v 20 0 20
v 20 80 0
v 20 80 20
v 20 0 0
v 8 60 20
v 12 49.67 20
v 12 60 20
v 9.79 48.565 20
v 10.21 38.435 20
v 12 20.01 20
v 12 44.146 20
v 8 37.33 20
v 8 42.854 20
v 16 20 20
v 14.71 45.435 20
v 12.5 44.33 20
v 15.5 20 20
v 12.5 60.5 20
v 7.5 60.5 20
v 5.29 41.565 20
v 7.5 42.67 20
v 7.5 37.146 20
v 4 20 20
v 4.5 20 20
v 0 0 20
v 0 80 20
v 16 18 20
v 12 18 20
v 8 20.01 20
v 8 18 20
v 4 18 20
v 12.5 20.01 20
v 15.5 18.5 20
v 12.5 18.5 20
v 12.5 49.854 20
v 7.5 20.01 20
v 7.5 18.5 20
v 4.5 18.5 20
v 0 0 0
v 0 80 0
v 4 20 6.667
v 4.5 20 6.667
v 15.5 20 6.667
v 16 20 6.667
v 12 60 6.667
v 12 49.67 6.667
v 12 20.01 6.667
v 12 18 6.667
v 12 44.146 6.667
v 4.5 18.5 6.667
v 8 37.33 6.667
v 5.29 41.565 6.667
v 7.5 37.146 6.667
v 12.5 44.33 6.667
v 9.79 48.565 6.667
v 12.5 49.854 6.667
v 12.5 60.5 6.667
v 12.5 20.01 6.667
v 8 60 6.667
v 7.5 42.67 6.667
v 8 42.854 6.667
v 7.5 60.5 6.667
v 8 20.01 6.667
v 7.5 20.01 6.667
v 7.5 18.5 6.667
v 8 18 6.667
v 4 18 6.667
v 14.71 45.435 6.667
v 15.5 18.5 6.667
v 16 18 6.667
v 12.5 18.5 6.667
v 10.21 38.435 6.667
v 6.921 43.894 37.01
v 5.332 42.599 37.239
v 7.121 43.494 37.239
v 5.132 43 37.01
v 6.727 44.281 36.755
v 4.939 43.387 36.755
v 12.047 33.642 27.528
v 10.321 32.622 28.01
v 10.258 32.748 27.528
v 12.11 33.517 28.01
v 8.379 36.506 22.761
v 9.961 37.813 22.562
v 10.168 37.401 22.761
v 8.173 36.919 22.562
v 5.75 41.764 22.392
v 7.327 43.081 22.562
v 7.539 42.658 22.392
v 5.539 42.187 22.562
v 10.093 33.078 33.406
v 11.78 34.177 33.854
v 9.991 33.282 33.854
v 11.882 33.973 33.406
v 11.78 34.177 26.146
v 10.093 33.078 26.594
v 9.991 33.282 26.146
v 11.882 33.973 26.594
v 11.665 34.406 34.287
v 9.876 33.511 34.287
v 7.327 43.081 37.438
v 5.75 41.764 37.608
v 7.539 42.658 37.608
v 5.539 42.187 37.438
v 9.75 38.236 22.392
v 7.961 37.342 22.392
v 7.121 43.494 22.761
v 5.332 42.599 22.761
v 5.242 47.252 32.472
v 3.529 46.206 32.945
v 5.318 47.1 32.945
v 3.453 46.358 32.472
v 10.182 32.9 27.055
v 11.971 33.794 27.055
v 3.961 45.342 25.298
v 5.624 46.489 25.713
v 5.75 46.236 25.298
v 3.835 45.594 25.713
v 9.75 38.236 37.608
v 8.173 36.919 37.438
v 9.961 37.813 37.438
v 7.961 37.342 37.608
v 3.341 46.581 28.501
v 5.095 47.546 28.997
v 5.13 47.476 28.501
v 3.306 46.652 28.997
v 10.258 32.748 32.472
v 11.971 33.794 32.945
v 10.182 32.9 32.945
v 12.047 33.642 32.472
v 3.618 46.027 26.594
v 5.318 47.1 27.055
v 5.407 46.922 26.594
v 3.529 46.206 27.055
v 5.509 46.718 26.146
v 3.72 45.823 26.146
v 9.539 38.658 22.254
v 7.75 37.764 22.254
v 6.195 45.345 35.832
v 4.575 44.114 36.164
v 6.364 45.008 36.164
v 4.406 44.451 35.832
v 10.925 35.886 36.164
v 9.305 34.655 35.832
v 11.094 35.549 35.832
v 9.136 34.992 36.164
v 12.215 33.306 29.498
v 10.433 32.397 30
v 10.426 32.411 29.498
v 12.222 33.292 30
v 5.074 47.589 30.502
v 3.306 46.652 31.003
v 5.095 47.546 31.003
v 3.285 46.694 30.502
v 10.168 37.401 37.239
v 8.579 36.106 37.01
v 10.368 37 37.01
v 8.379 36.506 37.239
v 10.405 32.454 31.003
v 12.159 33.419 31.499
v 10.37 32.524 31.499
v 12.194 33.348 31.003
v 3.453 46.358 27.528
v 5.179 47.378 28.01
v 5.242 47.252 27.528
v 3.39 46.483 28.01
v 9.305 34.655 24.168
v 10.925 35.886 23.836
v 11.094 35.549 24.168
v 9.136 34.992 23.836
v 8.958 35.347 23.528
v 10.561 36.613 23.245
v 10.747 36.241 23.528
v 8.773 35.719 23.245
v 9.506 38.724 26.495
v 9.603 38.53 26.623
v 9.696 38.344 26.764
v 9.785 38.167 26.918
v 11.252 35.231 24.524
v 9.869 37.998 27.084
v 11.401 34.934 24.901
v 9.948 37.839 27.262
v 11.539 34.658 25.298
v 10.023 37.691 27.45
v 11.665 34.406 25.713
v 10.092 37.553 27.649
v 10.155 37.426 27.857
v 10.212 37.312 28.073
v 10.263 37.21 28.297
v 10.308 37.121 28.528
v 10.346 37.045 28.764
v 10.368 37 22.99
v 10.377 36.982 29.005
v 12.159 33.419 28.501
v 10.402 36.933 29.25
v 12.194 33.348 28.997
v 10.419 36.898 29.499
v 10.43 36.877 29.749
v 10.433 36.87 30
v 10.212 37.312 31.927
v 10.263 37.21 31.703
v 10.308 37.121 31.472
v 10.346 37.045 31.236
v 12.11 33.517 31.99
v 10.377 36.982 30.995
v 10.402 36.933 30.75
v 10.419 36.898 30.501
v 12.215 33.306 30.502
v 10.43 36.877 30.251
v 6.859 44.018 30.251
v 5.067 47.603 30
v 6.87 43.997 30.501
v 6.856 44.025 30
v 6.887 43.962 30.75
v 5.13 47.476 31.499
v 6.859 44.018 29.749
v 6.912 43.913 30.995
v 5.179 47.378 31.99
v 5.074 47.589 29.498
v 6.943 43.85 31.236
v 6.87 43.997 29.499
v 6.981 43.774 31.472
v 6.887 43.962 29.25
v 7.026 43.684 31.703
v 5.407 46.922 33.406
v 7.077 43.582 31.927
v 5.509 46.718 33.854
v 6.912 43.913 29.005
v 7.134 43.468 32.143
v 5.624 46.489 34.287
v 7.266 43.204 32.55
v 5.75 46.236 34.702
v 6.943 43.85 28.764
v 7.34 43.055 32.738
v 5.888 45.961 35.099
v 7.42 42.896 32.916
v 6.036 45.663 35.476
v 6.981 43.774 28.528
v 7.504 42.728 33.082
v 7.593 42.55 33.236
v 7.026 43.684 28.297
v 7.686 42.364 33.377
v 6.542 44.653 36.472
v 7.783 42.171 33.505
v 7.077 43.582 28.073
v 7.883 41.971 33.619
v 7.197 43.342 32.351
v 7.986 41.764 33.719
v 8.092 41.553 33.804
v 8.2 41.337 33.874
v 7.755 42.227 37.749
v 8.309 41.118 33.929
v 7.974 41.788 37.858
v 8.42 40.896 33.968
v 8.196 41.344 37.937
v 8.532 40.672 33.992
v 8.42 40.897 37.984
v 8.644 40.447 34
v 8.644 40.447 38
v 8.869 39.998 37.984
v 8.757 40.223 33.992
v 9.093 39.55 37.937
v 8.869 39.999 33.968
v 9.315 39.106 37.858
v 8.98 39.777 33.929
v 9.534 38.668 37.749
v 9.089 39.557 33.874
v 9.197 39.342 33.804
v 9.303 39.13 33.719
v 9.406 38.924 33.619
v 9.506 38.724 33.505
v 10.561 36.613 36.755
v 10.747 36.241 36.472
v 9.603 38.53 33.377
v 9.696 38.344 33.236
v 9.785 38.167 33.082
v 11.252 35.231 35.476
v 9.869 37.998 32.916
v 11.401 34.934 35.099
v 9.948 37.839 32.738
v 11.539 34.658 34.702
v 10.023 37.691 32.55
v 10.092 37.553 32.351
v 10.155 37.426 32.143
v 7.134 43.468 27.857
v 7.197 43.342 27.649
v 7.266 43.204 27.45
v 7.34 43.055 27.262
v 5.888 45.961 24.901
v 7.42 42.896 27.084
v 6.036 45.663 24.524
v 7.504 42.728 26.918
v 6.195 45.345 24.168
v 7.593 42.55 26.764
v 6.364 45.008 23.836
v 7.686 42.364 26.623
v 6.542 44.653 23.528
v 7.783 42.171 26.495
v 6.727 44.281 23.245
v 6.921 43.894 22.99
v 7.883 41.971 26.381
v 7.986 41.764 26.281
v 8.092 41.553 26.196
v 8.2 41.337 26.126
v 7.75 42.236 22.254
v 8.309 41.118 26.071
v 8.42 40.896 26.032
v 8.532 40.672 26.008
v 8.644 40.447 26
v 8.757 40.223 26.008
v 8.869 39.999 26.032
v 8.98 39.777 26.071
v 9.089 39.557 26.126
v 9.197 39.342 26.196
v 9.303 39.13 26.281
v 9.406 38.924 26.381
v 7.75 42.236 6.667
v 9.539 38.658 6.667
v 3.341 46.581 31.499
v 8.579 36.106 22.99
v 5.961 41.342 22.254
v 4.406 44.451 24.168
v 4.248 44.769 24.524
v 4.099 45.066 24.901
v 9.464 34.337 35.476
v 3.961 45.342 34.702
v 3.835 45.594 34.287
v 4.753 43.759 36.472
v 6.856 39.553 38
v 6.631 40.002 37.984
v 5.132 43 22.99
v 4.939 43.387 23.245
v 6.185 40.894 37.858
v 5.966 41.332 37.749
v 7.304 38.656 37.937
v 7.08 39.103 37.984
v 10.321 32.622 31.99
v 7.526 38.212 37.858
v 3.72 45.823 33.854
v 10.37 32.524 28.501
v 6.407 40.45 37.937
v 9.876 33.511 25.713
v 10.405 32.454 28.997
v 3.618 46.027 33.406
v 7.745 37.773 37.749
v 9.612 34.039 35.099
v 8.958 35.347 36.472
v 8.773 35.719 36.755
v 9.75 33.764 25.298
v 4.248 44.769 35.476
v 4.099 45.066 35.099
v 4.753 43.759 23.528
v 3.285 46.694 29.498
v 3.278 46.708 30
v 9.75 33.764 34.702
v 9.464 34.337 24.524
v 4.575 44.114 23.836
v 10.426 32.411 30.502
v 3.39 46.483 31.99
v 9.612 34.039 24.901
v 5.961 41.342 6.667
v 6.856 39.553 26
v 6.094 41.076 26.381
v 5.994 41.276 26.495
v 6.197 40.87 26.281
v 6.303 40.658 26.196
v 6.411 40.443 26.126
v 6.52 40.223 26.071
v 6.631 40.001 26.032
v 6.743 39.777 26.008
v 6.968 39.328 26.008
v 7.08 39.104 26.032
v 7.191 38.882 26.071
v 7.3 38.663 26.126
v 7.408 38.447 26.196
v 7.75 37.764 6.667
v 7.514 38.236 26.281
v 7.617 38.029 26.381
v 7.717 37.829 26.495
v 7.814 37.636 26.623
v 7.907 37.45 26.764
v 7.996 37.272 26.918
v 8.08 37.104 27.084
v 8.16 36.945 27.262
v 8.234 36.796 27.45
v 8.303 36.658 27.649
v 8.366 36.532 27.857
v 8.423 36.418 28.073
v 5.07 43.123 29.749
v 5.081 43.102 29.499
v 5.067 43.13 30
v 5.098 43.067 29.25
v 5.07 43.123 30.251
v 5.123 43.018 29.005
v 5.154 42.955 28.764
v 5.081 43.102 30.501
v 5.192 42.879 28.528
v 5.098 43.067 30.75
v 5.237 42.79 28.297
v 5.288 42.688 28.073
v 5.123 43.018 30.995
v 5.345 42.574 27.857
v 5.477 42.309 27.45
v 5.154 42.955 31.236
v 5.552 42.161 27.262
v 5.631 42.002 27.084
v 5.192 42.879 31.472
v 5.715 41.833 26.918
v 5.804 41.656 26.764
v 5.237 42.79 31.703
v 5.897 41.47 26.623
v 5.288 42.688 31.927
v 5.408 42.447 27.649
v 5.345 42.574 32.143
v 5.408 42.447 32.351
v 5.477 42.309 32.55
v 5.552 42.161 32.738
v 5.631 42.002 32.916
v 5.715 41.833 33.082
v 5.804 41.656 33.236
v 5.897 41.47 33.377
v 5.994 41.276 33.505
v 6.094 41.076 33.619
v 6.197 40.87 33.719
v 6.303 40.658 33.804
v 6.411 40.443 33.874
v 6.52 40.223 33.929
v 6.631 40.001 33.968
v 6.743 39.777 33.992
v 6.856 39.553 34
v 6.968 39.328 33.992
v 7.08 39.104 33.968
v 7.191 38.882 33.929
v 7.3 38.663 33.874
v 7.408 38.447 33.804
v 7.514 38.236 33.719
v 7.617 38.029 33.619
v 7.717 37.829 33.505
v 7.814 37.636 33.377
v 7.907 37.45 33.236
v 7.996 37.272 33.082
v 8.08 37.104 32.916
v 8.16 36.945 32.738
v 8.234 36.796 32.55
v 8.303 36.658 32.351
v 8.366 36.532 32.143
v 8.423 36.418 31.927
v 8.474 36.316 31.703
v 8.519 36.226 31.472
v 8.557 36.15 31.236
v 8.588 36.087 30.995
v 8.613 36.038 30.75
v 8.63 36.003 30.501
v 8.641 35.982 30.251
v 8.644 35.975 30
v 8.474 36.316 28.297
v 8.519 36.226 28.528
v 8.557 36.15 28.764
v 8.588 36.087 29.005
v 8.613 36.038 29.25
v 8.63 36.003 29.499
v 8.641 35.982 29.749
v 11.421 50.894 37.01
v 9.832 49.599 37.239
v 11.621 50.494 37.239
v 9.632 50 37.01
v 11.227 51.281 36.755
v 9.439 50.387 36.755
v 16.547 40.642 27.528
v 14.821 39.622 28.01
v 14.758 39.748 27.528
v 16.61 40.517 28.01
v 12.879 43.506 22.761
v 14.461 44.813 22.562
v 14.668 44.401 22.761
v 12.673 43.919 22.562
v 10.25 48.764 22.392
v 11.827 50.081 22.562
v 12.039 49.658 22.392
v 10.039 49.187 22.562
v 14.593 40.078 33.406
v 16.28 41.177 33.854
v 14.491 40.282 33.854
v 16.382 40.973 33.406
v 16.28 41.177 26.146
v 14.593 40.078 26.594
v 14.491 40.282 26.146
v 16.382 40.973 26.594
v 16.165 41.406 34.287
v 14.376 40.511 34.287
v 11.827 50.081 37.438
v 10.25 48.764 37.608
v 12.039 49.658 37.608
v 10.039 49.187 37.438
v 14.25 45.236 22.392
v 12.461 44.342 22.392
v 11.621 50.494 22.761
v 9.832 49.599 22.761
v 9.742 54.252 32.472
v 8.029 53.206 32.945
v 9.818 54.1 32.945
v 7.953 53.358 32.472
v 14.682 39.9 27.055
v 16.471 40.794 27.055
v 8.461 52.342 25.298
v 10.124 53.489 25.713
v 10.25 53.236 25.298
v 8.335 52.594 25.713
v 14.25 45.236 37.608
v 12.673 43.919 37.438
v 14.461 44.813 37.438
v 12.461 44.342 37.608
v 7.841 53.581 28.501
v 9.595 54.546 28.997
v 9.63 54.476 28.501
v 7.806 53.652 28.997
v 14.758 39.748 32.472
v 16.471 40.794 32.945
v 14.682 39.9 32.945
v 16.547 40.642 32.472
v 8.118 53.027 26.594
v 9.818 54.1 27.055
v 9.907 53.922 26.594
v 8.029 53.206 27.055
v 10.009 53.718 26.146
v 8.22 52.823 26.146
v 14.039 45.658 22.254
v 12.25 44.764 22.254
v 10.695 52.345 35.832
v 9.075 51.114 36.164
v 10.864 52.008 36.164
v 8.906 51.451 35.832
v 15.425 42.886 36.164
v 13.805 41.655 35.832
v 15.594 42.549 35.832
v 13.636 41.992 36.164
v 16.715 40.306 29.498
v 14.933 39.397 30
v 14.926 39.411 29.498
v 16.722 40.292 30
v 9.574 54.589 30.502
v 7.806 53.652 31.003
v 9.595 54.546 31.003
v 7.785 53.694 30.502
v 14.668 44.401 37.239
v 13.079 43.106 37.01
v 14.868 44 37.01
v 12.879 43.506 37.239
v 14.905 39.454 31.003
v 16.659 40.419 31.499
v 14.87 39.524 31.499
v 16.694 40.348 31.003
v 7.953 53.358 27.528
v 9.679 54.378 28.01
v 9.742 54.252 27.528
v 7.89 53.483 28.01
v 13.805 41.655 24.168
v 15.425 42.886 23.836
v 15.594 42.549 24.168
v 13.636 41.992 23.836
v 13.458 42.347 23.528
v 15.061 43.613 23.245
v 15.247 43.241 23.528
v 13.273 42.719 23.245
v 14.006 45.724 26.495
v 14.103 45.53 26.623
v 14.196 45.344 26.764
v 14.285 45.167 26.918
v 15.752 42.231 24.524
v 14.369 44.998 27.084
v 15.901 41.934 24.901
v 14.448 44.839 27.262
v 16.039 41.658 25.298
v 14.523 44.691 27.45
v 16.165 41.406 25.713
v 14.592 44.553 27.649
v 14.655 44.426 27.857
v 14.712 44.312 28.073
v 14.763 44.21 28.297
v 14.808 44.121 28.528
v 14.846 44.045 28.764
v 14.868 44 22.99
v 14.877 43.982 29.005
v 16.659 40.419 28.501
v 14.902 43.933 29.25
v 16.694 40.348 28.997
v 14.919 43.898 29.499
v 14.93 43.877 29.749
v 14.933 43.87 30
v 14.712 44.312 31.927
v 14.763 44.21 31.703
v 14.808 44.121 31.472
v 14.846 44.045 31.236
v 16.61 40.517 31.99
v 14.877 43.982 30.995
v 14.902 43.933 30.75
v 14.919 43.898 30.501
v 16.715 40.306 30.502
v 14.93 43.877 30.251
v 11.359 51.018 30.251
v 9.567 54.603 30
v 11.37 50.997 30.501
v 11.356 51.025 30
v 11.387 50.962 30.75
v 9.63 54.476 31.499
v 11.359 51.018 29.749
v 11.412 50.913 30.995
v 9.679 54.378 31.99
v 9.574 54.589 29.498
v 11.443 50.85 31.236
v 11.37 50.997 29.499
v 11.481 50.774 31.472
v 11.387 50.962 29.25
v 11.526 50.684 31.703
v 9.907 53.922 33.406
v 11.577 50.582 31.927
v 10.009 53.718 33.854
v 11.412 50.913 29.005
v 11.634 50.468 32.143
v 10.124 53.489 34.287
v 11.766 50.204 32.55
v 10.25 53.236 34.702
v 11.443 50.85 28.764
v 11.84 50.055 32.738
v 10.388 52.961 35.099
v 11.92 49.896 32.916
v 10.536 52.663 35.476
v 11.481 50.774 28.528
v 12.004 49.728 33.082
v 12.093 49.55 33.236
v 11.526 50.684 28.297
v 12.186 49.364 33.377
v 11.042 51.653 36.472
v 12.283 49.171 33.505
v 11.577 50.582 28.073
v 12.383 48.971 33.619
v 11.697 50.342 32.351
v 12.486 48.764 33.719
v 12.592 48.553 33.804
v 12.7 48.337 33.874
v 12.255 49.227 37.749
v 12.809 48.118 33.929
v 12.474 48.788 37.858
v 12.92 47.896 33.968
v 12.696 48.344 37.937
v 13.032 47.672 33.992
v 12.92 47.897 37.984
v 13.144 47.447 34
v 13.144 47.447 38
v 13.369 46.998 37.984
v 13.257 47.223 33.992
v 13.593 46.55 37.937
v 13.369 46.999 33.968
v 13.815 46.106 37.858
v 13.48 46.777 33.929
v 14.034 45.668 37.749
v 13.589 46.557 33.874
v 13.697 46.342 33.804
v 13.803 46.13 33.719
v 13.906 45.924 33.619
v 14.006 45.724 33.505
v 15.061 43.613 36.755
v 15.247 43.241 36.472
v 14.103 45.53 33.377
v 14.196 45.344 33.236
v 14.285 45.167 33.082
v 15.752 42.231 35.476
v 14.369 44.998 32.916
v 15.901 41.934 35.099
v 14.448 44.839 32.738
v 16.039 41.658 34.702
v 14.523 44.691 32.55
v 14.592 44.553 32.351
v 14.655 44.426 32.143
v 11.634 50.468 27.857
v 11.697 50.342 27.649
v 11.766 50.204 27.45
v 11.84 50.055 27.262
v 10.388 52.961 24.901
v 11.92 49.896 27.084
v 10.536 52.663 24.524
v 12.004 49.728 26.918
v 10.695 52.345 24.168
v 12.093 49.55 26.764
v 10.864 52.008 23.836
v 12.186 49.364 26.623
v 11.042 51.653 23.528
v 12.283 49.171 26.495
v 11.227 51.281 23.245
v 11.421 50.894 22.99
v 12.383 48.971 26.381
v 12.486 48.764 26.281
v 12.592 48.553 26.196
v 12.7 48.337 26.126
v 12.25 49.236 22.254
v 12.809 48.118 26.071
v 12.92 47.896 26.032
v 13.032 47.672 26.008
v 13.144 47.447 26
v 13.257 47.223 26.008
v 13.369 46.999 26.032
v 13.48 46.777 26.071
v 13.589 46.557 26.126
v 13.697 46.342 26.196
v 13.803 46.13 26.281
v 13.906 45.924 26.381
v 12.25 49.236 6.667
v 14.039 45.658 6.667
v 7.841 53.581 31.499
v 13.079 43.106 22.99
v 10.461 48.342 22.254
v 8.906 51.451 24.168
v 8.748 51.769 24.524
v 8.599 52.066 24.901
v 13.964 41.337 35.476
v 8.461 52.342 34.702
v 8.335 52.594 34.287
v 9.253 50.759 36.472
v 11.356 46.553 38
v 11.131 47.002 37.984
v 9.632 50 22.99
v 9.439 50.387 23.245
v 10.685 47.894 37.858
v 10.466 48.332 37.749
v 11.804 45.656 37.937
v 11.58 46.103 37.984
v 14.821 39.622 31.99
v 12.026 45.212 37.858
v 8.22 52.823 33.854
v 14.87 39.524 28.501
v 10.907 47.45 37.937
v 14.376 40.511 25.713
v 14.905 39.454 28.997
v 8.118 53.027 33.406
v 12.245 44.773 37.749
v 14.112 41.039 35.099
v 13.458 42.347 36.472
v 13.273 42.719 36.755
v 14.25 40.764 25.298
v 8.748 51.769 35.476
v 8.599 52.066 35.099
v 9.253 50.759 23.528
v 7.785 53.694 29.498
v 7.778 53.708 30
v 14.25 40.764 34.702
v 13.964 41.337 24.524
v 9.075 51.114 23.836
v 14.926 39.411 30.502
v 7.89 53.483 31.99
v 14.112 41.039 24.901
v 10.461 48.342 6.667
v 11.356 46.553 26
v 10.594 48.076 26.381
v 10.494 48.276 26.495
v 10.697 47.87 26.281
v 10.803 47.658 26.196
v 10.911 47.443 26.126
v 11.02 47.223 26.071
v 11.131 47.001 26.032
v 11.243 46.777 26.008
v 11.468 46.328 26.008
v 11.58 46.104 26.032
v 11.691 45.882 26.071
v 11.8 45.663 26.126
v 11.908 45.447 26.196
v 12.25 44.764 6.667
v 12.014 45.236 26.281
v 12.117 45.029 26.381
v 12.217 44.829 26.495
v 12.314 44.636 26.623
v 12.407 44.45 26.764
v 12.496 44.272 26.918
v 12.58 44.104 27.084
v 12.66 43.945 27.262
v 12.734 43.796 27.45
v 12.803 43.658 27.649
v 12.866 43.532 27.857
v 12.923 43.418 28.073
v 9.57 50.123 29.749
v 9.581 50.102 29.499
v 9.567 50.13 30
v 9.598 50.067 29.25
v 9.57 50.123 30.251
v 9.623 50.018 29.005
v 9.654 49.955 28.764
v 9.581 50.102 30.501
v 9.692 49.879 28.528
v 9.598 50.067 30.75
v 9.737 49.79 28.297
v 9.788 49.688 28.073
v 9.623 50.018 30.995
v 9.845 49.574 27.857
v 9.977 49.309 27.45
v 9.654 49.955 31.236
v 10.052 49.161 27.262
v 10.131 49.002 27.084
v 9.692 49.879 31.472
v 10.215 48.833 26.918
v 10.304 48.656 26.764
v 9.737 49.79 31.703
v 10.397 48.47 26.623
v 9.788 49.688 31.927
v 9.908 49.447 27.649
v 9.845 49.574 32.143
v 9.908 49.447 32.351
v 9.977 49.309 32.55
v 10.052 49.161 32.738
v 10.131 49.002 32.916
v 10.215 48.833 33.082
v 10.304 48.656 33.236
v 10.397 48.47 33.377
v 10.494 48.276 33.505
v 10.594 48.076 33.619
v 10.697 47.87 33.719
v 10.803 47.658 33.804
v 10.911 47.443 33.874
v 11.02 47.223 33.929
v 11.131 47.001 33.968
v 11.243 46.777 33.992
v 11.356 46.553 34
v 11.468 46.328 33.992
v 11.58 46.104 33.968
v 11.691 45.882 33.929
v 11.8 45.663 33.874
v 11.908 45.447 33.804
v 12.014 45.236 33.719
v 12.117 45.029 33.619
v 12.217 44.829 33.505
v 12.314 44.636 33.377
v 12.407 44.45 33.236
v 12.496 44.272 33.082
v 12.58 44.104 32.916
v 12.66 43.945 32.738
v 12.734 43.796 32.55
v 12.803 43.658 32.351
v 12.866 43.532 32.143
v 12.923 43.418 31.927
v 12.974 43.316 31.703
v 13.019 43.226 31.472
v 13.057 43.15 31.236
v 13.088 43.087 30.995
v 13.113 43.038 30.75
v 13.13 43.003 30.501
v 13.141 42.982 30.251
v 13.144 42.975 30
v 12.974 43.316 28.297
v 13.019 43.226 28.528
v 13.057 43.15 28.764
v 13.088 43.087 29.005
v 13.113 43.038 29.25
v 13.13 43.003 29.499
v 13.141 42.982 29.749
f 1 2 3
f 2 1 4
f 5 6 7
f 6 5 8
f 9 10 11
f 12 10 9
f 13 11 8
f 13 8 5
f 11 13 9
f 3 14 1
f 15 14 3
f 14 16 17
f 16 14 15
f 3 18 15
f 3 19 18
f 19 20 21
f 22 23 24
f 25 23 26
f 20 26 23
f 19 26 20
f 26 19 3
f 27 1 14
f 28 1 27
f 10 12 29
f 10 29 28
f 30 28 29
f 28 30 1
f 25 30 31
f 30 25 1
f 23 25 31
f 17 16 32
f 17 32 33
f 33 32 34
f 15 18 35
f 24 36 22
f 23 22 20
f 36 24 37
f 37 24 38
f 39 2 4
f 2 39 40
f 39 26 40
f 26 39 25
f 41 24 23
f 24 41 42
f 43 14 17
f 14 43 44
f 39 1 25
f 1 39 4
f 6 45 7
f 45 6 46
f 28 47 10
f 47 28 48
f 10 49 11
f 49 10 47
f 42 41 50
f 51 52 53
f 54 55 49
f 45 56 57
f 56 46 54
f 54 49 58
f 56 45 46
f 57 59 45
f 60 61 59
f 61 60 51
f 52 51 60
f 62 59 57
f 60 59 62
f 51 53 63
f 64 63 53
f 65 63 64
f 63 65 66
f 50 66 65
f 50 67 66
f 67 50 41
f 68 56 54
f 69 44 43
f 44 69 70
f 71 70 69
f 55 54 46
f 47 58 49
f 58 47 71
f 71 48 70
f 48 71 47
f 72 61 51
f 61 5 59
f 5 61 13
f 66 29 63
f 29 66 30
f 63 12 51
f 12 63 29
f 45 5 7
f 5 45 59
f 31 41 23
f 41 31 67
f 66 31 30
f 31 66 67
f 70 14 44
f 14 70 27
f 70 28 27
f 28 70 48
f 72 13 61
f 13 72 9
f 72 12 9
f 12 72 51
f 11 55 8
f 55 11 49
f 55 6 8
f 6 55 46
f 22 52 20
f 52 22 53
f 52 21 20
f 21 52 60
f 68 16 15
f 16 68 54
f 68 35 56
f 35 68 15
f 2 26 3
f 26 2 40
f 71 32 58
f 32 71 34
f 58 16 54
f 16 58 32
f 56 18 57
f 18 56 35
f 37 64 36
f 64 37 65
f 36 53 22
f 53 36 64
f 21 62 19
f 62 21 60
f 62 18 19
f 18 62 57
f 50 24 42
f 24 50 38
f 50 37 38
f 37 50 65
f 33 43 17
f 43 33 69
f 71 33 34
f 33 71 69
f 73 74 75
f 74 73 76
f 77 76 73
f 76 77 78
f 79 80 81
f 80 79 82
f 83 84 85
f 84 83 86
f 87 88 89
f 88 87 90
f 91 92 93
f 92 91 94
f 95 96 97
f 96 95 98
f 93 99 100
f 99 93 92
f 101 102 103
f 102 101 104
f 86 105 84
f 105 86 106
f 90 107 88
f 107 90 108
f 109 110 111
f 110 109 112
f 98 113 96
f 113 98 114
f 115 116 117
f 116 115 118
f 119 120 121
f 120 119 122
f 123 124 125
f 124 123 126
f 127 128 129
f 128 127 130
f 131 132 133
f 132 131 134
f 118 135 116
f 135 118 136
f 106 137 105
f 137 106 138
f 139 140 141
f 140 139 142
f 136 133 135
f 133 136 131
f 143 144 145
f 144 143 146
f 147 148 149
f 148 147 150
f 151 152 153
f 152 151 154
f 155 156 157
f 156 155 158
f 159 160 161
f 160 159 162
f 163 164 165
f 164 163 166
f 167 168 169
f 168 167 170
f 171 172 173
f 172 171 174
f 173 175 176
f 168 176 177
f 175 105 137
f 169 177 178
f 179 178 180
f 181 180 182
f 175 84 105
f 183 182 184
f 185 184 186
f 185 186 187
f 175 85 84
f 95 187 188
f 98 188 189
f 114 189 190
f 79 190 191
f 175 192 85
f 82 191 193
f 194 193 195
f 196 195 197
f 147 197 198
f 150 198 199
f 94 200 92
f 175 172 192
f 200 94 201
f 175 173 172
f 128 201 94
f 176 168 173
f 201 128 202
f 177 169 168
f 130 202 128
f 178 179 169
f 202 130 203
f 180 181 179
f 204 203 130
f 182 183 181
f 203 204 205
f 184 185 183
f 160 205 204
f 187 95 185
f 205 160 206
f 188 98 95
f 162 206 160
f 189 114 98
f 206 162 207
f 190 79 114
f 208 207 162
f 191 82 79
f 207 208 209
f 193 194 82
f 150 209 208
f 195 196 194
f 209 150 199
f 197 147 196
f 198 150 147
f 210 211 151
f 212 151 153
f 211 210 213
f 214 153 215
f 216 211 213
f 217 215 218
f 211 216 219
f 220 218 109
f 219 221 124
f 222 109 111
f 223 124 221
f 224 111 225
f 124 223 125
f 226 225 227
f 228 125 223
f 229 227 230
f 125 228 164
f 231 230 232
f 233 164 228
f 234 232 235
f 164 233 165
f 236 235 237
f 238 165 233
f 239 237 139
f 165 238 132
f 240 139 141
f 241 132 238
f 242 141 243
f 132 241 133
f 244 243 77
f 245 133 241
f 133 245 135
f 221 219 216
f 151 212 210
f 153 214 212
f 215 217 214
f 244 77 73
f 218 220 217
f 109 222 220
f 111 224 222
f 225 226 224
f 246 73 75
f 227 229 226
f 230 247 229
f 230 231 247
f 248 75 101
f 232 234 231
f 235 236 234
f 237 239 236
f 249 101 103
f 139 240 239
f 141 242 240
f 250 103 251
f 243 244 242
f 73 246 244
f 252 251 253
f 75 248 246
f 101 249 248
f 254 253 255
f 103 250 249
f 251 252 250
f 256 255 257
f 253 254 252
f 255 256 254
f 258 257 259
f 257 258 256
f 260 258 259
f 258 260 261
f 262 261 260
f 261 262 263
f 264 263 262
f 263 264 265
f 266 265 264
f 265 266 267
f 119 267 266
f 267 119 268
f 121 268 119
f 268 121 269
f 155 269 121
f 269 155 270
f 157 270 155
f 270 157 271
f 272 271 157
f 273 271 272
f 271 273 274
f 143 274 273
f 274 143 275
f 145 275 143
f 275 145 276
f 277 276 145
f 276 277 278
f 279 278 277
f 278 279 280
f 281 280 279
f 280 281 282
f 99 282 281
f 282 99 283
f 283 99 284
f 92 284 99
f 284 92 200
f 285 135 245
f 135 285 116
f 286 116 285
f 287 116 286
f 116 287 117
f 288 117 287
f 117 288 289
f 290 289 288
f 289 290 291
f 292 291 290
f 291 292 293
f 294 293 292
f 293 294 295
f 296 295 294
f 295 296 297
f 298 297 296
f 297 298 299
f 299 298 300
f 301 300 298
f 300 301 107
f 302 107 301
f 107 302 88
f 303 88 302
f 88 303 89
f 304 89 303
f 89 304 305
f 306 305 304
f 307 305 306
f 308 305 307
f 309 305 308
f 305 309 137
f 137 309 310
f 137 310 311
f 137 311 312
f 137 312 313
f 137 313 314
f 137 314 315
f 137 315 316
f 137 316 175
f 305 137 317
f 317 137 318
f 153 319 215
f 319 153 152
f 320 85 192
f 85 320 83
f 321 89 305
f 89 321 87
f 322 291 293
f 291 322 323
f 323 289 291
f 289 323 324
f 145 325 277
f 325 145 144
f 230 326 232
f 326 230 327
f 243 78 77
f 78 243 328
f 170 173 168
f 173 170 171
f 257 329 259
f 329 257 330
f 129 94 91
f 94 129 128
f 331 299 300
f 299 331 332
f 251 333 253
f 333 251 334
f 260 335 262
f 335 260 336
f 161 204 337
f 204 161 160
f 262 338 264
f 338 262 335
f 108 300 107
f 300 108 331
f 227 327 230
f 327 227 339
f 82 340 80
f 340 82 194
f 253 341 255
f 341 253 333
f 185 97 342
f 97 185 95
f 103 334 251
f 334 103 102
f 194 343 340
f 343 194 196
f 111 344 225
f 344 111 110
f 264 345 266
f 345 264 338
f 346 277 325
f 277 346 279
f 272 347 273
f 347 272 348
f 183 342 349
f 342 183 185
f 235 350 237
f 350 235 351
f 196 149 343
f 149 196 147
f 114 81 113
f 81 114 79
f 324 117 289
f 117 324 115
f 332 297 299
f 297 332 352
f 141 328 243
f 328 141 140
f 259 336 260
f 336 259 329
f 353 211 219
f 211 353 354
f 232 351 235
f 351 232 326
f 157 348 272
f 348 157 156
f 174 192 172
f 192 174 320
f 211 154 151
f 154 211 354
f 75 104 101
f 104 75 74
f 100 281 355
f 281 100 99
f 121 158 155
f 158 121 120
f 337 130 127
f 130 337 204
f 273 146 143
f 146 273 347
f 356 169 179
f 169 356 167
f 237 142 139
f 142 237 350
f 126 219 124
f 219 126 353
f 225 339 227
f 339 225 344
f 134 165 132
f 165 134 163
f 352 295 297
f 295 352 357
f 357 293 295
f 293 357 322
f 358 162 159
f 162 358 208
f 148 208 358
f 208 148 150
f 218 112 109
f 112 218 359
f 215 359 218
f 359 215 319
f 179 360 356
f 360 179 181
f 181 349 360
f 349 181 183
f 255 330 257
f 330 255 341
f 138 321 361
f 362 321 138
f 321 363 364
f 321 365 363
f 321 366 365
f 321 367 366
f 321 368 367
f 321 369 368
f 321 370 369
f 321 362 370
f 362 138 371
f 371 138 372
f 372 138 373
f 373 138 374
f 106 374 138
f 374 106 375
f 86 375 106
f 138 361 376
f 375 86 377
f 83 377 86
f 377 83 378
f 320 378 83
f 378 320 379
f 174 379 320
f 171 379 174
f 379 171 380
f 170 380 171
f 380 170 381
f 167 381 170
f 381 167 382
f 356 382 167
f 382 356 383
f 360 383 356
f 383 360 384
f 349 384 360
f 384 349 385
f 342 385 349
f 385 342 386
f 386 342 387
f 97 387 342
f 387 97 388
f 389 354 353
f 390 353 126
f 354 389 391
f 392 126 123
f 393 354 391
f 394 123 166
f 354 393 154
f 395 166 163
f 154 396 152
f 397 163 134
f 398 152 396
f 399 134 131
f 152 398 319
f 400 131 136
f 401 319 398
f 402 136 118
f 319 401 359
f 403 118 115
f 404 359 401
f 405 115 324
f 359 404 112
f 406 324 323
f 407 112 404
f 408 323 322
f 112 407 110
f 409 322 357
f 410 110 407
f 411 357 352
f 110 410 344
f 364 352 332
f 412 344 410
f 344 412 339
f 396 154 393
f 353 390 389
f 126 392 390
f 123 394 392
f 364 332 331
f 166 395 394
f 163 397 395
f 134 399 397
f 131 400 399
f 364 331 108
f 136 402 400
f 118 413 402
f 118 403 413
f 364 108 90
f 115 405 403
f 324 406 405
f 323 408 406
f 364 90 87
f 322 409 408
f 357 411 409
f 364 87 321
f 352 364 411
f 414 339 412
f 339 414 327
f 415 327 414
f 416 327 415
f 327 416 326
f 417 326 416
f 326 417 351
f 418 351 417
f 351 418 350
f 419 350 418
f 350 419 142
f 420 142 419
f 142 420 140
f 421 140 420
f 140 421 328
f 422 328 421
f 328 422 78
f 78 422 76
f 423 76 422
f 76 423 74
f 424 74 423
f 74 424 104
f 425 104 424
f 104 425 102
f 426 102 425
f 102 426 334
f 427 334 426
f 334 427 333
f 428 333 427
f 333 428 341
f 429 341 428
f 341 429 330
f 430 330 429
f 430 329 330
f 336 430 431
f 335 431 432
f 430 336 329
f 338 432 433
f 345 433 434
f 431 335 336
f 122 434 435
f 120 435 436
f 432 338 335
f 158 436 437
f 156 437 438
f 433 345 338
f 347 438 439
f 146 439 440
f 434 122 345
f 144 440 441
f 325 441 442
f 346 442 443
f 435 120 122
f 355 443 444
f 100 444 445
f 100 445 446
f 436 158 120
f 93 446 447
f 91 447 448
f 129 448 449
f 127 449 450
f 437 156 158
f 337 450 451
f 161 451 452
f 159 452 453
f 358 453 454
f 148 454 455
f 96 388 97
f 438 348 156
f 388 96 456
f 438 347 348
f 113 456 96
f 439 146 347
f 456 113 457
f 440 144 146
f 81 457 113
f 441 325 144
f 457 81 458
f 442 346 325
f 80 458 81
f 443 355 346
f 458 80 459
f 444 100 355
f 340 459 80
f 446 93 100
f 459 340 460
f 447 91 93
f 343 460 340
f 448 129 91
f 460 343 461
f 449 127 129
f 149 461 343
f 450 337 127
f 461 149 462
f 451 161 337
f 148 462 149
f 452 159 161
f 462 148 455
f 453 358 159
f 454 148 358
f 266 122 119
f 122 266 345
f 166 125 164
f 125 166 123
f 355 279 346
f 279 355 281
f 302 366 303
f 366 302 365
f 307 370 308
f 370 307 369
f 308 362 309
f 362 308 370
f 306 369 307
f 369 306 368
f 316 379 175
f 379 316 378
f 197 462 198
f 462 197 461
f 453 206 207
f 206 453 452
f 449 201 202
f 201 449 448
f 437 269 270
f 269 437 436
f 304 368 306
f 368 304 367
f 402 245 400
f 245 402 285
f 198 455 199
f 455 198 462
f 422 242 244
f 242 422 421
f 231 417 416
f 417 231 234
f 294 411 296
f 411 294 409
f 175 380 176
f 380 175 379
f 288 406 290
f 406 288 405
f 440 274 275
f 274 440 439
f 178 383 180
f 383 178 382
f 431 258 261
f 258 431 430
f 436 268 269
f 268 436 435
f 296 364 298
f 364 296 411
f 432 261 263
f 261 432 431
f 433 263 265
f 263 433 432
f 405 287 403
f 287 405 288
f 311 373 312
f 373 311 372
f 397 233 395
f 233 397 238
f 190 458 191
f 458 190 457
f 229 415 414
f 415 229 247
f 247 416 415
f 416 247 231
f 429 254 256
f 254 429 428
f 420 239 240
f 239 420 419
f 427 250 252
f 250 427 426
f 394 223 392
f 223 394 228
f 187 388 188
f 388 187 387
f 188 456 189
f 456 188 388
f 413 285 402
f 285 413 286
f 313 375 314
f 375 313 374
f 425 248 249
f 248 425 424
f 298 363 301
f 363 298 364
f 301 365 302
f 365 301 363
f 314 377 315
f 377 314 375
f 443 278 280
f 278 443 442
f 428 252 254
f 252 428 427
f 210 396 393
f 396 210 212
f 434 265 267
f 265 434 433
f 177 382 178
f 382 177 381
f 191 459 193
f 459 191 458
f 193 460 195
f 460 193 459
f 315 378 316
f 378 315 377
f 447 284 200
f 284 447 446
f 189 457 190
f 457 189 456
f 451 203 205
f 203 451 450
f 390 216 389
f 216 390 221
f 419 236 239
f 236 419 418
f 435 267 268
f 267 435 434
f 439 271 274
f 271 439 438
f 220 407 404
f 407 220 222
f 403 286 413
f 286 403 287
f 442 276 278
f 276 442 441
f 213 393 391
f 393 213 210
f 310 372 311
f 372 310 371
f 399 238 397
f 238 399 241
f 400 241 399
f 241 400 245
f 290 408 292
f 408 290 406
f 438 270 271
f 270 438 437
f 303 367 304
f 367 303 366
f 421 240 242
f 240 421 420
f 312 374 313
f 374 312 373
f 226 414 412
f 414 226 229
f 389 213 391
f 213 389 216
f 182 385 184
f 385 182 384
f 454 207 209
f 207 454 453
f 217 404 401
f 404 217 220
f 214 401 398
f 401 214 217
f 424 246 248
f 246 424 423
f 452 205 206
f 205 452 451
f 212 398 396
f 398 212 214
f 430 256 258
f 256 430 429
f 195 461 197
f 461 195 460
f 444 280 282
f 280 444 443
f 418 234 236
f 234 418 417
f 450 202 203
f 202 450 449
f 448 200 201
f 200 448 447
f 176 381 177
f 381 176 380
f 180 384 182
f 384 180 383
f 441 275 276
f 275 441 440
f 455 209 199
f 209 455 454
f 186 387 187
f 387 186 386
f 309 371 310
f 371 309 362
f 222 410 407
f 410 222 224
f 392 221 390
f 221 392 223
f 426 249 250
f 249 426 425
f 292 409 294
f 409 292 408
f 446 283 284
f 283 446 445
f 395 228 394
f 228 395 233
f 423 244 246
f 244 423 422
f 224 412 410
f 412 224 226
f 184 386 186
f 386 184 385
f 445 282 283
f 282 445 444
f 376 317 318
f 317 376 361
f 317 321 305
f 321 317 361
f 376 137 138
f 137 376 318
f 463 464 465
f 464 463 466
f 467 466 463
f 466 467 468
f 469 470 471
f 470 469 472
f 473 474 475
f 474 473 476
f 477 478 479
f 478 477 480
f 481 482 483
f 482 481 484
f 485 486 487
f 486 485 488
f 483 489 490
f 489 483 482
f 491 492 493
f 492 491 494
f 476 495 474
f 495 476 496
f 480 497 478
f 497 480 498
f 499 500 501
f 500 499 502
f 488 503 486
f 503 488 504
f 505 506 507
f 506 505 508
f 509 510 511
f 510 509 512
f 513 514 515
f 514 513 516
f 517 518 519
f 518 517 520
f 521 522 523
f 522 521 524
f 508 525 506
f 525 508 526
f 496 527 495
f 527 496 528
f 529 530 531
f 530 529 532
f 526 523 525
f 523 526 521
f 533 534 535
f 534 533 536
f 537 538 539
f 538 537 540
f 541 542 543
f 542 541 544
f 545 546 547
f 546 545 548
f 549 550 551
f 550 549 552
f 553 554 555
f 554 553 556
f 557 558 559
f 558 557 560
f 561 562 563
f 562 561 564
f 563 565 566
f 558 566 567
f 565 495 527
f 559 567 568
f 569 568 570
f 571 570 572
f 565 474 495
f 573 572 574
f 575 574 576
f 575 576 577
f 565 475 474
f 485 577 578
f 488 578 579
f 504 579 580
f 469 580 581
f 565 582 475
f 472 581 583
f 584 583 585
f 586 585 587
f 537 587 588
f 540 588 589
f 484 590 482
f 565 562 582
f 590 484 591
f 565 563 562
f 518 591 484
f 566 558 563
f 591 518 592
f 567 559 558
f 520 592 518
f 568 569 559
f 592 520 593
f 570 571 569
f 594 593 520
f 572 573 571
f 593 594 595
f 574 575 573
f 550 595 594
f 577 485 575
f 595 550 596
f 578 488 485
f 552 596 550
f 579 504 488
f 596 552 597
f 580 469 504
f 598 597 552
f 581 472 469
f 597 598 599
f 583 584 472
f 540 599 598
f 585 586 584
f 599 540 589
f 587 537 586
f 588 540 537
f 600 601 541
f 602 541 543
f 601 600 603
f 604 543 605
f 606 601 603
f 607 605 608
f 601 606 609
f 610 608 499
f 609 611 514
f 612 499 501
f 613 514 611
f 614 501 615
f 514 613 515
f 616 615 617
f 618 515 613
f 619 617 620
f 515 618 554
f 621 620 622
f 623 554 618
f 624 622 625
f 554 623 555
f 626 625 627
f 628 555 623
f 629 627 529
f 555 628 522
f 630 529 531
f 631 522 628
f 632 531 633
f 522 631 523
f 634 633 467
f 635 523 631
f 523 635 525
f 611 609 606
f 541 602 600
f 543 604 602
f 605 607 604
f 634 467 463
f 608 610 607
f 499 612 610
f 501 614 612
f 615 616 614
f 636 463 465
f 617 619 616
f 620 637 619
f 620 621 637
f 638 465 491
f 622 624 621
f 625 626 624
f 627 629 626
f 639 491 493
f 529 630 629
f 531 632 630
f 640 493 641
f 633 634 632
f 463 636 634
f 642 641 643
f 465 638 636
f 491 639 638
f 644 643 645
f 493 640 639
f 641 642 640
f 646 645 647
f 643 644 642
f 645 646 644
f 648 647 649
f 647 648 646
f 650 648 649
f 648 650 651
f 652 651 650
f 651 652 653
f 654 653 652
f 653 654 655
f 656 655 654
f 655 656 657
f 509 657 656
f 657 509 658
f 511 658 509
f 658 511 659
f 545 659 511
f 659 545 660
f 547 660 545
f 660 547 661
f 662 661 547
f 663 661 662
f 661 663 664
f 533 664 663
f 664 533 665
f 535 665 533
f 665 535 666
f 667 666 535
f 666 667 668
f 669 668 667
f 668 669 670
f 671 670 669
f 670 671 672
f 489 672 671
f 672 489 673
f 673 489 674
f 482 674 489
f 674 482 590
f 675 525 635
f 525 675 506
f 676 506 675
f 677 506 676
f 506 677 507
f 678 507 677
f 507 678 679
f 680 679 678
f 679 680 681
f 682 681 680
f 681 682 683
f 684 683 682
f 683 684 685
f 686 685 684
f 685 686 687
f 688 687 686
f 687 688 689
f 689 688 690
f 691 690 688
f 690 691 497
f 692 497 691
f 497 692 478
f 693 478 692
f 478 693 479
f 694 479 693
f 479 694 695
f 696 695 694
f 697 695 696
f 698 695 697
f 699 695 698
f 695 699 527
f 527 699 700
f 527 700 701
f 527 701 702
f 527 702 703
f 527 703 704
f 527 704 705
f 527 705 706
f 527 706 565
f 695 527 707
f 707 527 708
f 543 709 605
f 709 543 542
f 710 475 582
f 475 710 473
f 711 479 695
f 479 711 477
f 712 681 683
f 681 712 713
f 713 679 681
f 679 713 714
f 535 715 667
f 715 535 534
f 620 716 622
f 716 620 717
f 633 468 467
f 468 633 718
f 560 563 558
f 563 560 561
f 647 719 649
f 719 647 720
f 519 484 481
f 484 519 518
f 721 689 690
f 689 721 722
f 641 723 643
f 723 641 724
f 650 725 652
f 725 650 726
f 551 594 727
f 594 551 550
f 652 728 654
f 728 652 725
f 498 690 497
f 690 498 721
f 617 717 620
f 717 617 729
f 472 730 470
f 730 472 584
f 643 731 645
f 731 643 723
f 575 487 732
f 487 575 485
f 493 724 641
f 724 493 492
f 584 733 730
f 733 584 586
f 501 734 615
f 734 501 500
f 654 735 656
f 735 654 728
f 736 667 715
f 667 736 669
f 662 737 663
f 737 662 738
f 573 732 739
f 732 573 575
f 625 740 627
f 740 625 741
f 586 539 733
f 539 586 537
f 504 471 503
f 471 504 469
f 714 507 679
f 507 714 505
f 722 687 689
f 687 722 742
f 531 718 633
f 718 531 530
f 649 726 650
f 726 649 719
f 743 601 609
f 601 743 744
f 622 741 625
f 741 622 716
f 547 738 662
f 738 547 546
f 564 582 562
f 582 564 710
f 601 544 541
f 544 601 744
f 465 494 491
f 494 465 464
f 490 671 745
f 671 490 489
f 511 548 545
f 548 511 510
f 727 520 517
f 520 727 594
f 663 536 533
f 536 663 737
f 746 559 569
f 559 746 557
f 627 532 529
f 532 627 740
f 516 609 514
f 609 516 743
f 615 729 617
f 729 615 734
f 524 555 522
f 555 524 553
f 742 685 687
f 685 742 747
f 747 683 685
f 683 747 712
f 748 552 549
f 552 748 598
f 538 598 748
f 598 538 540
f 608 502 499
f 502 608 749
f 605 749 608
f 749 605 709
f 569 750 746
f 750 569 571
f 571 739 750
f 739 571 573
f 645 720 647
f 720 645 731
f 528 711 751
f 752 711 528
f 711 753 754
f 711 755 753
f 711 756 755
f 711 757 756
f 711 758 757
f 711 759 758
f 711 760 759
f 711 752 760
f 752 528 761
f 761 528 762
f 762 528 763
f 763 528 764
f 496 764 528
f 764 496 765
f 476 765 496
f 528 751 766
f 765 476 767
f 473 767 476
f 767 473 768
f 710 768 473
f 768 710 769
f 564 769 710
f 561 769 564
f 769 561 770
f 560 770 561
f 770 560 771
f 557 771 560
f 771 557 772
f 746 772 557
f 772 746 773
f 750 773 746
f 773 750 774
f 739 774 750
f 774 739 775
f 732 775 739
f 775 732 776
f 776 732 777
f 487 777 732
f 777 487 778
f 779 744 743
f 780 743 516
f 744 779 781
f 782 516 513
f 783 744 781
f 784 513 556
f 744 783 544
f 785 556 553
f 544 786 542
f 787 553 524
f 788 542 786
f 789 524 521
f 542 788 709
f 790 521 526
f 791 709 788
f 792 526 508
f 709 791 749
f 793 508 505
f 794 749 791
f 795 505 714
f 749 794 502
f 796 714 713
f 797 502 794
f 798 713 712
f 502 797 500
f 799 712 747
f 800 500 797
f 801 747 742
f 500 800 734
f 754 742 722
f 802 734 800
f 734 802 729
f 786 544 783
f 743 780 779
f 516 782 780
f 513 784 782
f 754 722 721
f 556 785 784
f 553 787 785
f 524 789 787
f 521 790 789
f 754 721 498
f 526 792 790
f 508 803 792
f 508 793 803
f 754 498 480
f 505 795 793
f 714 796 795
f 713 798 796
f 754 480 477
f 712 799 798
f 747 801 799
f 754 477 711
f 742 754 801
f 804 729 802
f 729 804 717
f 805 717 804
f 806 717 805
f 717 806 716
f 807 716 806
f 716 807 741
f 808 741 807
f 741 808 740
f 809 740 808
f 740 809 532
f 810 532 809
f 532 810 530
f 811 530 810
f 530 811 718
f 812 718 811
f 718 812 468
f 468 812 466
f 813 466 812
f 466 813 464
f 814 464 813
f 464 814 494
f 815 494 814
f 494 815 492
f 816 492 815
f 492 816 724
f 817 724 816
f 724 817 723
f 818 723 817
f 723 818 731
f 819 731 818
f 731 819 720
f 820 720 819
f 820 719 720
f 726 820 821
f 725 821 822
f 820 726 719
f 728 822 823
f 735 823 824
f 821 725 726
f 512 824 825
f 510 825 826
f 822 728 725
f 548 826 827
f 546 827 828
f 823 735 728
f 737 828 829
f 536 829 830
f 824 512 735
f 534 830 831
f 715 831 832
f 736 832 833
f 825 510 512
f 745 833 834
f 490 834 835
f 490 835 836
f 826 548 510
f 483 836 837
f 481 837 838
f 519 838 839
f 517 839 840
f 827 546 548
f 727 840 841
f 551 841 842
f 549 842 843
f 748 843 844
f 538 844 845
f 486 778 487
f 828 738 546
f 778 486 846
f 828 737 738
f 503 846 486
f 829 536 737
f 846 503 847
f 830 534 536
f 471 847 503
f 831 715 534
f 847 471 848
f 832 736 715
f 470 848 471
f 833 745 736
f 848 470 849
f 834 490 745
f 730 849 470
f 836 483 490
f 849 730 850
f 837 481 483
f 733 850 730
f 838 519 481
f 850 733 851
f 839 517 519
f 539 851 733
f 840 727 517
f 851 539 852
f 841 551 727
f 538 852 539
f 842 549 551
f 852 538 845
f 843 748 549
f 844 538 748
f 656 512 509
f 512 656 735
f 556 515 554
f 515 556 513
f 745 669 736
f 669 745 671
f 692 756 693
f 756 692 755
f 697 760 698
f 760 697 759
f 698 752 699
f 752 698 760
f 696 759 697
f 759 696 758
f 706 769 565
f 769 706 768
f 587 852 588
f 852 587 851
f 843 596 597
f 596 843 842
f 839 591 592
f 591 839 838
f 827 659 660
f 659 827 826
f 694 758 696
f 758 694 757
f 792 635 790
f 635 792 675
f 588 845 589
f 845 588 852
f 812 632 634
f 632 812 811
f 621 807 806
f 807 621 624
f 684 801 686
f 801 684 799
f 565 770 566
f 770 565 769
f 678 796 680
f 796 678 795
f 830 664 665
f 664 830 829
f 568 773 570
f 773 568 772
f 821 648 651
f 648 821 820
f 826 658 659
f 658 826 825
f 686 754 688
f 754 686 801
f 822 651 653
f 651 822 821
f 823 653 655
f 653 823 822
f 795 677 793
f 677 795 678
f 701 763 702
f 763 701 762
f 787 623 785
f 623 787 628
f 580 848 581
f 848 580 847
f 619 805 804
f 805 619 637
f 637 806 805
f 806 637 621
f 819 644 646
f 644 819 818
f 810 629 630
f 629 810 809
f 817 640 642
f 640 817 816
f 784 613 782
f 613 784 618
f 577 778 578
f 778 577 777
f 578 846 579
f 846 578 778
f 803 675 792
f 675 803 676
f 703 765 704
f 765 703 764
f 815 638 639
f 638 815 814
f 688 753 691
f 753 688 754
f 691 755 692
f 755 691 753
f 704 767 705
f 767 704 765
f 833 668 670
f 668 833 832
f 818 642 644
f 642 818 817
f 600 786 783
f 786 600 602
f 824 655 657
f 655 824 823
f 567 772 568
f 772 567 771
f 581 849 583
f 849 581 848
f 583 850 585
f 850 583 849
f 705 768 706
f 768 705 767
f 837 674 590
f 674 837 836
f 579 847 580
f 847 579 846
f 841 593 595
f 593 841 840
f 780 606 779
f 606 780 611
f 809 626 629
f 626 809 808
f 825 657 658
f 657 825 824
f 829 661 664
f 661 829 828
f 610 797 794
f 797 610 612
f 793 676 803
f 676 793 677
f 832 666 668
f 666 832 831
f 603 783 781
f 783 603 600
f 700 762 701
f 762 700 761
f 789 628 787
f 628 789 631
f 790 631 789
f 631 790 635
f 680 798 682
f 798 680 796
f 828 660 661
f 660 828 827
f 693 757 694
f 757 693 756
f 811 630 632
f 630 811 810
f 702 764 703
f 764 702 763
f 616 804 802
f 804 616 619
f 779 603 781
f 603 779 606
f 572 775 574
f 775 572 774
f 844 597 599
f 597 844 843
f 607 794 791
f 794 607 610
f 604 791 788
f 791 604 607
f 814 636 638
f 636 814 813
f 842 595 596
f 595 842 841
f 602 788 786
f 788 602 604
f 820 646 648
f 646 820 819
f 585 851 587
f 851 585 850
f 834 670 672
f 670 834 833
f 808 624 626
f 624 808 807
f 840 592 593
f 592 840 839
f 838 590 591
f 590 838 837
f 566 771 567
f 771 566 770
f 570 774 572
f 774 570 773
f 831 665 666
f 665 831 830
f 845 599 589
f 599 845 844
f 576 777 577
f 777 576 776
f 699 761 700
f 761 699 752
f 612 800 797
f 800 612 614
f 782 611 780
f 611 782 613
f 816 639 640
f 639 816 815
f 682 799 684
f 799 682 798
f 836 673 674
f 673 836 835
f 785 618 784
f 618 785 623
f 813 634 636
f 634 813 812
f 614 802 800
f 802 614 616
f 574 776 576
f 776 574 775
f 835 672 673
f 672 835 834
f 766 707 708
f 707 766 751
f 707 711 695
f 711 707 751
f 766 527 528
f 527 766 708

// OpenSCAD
// Model for a 竿車知継ぎ (sa-oh sha-chi tsu-gee).
//
// Two bars are joined end to end. The male bar carries a long, thin tenon
// (竿, sao) that drops into an open-top mortise in the female bar. Two thin
// keys (車知, shachi) are then dropped in from the top. Each key sits in a
// slanted slot that straddles one wall of the mortise and bites into one
// edge of the tenon, so the tenon can no longer pull back out. Two small
// tongues (目違い, mechigai) on the female bar sit in matching notches on
// the end face of the male bar to stop the joint from twisting.
//
// The y axis runs along the bars:
//
//   y=0        body_len            body_len+tenon_len    body_len+female_len
//   |  male body  |  tenon inside the mortise  |  female only  |
//
// Clearances are controlled by `leeway`. The male bar and the keys are cut
// at nominal size; the mortise, the key slots and the tongues give up
// `leeway` on every mating face.

size = 20;            // cross-section of both bars
body_len = size;      // length of the solid part of the male bar
tenon_len = size*2;   // length of the tenon
female_len = size*3;  // length of the female bar (must exceed tenon_len)
leeway = size*0.025;  // clearance on mating faces (0.5 at size=20)
key_t = size/10;      // key thickness (the previous model used 1 at size=20, i.e. size/20)
key_w = size/5;       // key width

view = "assembled";   // ["assembled", "exploded", "print"]
part = "all";         // ["all", "male", "female", "key"]
explode = tenon_len + size/2; // how far the parts move apart in the exploded view

eps = 0.01;           // overlap so coplanar faces do not fight in preview

// Derived dimensions. Nothing below should need editing.
tenon_w = size/5;
tenon_x = size*2/5;   // x of the tenon's left face
tenon_z = size/3;     // z of the tenon's bottom (= floor of the mortise)
tenon_h = size*2/3;

tongue_w = size/5;
tongue_d = size/10;   // how far the tongues reach into the male bar
tongue_xs = [size/5, size*3/5];

// The key stands proud of the bar so it can be tapped, and so the pull ring
// clears the top face instead of biting into it.
key_stickout = size/5;
key_h = tenon_h + key_stickout;
key_angle = atan(key_t/key_w);        // tilt that puts the key's diagonal along y
slot_pitch = key_w + key_t + leeway*2; // y distance between the two slots

ring_r = size*2/5;    // outer radius of the pull ring on each key
ring_hole_r = size/5;
ring_overlap = size/10; // how far the ring overlaps the key plate

// Centre (x, y) of key slot i, measured from the joint face. Each slot sits
// halfway between a tenon face and the mortise wall next to it, and the two
// slots are staggered along y so the tenon is never bitten on both sides at
// the same spot.
function slot_center(i) = [
    i == 0 ? tenon_x - leeway/2 : tenon_x + tenon_w + leeway/2,
    tenon_len/2 + i*slot_pitch
];

// Slot for key i, from z0 up through the top face. `grow` widens the slot on
// every side; pass leeway when cutting, 0 gives the key's own footprint.
module key_slot(i, z0, grow=0) {
    c = slot_center(i);
    translate([c[0], c[1], z0])
        rotate([0, 0, key_angle])
            translate([-(key_t/2 + grow), -(key_w/2 + grow), 0])
                cube([key_t + 2*grow, key_w + 2*grow, size - z0 + eps]);
}

module male_bar() {
    difference() {
        union() {
            cube([size, body_len, size]);
            translate([tenon_x, body_len - eps, tenon_z])
                cube([tenon_w, tenon_len + eps, tenon_h]);
        }
        // notches for the female bar's tongues
        for (xloc = tongue_xs)
            translate([xloc, body_len - tongue_d, tenon_z])
                cube([tongue_w, tongue_d + eps, tenon_h + eps]);
        translate([0, body_len, 0])
            for (i = [0, 1]) key_slot(i, tenon_z - eps, leeway);
    }
}

module female_bar() {
    translate([0, body_len, 0]) {
        difference() {
            cube([size, female_len, size]);
            // mortise, open at the joint face and at the top
            translate([tenon_x - leeway, -eps, tenon_z])
                cube([tenon_w + 2*leeway, tenon_len + leeway + eps, tenon_h + eps]);
            for (i = [0, 1]) key_slot(i, tenon_z, leeway);
        }
        // tongues that reach into the male bar's notches
        for (xloc = tongue_xs)
            translate([xloc + leeway, -(tongue_d - leeway), tenon_z])
                cube([tongue_w - 2*leeway, tongue_d - leeway + eps, tenon_h]);
    }
}

// One key, standing as it is inserted: plate in the yz plane, bottom at z=0,
// pull ring above the top of the bar. Not yet tilted by key_angle.
module key() {
    translate([-key_t/2, -key_w/2, 0])
        cube([key_t, key_w, key_h]);
    translate([0, 0, key_h + ring_r - ring_overlap])
        rotate([0, 90, 0])
            difference() {
                cylinder(r=ring_r, h=key_t, center=true, $fn=100);
                cylinder(r=ring_hole_r, h=key_t + 2*eps, center=true, $fn=100);
            }
}

module key_in_place(i, lift=0) {
    c = slot_center(i);
    translate([c[0], body_len + c[1], tenon_z + lift])
        rotate([0, 0, key_angle])
            key();
}

// The key lying flat on the bed, plate along +y, ring at the far end.
module key_flat() {
    translate([0, 0, key_t/2])
        rotate([0, 0, 90])
            rotate([0, 90, 0])
                key();
}

function show(name) = part == "all" || part == name;

if (view == "print") {
    if (show("male")) color("Red", 1) male_bar();
    if (show("female")) color("Green", 1) translate([size*1.5, -body_len, 0]) female_bar();
    if (show("key")) color("Blue", 1)
        for (i = [0, 1]) translate([size*(3.5 + i), 0, 0]) key_flat();
} else {
    ex = view == "exploded" ? explode : 0;
    if (show("male")) color("Red", 1) translate([0, -ex, 0]) male_bar();
    if (show("female")) color("Green", 1) female_bar();
    if (show("key")) color("Blue", 1)
        for (i = [0, 1]) key_in_place(i, lift=ex/2);
}
